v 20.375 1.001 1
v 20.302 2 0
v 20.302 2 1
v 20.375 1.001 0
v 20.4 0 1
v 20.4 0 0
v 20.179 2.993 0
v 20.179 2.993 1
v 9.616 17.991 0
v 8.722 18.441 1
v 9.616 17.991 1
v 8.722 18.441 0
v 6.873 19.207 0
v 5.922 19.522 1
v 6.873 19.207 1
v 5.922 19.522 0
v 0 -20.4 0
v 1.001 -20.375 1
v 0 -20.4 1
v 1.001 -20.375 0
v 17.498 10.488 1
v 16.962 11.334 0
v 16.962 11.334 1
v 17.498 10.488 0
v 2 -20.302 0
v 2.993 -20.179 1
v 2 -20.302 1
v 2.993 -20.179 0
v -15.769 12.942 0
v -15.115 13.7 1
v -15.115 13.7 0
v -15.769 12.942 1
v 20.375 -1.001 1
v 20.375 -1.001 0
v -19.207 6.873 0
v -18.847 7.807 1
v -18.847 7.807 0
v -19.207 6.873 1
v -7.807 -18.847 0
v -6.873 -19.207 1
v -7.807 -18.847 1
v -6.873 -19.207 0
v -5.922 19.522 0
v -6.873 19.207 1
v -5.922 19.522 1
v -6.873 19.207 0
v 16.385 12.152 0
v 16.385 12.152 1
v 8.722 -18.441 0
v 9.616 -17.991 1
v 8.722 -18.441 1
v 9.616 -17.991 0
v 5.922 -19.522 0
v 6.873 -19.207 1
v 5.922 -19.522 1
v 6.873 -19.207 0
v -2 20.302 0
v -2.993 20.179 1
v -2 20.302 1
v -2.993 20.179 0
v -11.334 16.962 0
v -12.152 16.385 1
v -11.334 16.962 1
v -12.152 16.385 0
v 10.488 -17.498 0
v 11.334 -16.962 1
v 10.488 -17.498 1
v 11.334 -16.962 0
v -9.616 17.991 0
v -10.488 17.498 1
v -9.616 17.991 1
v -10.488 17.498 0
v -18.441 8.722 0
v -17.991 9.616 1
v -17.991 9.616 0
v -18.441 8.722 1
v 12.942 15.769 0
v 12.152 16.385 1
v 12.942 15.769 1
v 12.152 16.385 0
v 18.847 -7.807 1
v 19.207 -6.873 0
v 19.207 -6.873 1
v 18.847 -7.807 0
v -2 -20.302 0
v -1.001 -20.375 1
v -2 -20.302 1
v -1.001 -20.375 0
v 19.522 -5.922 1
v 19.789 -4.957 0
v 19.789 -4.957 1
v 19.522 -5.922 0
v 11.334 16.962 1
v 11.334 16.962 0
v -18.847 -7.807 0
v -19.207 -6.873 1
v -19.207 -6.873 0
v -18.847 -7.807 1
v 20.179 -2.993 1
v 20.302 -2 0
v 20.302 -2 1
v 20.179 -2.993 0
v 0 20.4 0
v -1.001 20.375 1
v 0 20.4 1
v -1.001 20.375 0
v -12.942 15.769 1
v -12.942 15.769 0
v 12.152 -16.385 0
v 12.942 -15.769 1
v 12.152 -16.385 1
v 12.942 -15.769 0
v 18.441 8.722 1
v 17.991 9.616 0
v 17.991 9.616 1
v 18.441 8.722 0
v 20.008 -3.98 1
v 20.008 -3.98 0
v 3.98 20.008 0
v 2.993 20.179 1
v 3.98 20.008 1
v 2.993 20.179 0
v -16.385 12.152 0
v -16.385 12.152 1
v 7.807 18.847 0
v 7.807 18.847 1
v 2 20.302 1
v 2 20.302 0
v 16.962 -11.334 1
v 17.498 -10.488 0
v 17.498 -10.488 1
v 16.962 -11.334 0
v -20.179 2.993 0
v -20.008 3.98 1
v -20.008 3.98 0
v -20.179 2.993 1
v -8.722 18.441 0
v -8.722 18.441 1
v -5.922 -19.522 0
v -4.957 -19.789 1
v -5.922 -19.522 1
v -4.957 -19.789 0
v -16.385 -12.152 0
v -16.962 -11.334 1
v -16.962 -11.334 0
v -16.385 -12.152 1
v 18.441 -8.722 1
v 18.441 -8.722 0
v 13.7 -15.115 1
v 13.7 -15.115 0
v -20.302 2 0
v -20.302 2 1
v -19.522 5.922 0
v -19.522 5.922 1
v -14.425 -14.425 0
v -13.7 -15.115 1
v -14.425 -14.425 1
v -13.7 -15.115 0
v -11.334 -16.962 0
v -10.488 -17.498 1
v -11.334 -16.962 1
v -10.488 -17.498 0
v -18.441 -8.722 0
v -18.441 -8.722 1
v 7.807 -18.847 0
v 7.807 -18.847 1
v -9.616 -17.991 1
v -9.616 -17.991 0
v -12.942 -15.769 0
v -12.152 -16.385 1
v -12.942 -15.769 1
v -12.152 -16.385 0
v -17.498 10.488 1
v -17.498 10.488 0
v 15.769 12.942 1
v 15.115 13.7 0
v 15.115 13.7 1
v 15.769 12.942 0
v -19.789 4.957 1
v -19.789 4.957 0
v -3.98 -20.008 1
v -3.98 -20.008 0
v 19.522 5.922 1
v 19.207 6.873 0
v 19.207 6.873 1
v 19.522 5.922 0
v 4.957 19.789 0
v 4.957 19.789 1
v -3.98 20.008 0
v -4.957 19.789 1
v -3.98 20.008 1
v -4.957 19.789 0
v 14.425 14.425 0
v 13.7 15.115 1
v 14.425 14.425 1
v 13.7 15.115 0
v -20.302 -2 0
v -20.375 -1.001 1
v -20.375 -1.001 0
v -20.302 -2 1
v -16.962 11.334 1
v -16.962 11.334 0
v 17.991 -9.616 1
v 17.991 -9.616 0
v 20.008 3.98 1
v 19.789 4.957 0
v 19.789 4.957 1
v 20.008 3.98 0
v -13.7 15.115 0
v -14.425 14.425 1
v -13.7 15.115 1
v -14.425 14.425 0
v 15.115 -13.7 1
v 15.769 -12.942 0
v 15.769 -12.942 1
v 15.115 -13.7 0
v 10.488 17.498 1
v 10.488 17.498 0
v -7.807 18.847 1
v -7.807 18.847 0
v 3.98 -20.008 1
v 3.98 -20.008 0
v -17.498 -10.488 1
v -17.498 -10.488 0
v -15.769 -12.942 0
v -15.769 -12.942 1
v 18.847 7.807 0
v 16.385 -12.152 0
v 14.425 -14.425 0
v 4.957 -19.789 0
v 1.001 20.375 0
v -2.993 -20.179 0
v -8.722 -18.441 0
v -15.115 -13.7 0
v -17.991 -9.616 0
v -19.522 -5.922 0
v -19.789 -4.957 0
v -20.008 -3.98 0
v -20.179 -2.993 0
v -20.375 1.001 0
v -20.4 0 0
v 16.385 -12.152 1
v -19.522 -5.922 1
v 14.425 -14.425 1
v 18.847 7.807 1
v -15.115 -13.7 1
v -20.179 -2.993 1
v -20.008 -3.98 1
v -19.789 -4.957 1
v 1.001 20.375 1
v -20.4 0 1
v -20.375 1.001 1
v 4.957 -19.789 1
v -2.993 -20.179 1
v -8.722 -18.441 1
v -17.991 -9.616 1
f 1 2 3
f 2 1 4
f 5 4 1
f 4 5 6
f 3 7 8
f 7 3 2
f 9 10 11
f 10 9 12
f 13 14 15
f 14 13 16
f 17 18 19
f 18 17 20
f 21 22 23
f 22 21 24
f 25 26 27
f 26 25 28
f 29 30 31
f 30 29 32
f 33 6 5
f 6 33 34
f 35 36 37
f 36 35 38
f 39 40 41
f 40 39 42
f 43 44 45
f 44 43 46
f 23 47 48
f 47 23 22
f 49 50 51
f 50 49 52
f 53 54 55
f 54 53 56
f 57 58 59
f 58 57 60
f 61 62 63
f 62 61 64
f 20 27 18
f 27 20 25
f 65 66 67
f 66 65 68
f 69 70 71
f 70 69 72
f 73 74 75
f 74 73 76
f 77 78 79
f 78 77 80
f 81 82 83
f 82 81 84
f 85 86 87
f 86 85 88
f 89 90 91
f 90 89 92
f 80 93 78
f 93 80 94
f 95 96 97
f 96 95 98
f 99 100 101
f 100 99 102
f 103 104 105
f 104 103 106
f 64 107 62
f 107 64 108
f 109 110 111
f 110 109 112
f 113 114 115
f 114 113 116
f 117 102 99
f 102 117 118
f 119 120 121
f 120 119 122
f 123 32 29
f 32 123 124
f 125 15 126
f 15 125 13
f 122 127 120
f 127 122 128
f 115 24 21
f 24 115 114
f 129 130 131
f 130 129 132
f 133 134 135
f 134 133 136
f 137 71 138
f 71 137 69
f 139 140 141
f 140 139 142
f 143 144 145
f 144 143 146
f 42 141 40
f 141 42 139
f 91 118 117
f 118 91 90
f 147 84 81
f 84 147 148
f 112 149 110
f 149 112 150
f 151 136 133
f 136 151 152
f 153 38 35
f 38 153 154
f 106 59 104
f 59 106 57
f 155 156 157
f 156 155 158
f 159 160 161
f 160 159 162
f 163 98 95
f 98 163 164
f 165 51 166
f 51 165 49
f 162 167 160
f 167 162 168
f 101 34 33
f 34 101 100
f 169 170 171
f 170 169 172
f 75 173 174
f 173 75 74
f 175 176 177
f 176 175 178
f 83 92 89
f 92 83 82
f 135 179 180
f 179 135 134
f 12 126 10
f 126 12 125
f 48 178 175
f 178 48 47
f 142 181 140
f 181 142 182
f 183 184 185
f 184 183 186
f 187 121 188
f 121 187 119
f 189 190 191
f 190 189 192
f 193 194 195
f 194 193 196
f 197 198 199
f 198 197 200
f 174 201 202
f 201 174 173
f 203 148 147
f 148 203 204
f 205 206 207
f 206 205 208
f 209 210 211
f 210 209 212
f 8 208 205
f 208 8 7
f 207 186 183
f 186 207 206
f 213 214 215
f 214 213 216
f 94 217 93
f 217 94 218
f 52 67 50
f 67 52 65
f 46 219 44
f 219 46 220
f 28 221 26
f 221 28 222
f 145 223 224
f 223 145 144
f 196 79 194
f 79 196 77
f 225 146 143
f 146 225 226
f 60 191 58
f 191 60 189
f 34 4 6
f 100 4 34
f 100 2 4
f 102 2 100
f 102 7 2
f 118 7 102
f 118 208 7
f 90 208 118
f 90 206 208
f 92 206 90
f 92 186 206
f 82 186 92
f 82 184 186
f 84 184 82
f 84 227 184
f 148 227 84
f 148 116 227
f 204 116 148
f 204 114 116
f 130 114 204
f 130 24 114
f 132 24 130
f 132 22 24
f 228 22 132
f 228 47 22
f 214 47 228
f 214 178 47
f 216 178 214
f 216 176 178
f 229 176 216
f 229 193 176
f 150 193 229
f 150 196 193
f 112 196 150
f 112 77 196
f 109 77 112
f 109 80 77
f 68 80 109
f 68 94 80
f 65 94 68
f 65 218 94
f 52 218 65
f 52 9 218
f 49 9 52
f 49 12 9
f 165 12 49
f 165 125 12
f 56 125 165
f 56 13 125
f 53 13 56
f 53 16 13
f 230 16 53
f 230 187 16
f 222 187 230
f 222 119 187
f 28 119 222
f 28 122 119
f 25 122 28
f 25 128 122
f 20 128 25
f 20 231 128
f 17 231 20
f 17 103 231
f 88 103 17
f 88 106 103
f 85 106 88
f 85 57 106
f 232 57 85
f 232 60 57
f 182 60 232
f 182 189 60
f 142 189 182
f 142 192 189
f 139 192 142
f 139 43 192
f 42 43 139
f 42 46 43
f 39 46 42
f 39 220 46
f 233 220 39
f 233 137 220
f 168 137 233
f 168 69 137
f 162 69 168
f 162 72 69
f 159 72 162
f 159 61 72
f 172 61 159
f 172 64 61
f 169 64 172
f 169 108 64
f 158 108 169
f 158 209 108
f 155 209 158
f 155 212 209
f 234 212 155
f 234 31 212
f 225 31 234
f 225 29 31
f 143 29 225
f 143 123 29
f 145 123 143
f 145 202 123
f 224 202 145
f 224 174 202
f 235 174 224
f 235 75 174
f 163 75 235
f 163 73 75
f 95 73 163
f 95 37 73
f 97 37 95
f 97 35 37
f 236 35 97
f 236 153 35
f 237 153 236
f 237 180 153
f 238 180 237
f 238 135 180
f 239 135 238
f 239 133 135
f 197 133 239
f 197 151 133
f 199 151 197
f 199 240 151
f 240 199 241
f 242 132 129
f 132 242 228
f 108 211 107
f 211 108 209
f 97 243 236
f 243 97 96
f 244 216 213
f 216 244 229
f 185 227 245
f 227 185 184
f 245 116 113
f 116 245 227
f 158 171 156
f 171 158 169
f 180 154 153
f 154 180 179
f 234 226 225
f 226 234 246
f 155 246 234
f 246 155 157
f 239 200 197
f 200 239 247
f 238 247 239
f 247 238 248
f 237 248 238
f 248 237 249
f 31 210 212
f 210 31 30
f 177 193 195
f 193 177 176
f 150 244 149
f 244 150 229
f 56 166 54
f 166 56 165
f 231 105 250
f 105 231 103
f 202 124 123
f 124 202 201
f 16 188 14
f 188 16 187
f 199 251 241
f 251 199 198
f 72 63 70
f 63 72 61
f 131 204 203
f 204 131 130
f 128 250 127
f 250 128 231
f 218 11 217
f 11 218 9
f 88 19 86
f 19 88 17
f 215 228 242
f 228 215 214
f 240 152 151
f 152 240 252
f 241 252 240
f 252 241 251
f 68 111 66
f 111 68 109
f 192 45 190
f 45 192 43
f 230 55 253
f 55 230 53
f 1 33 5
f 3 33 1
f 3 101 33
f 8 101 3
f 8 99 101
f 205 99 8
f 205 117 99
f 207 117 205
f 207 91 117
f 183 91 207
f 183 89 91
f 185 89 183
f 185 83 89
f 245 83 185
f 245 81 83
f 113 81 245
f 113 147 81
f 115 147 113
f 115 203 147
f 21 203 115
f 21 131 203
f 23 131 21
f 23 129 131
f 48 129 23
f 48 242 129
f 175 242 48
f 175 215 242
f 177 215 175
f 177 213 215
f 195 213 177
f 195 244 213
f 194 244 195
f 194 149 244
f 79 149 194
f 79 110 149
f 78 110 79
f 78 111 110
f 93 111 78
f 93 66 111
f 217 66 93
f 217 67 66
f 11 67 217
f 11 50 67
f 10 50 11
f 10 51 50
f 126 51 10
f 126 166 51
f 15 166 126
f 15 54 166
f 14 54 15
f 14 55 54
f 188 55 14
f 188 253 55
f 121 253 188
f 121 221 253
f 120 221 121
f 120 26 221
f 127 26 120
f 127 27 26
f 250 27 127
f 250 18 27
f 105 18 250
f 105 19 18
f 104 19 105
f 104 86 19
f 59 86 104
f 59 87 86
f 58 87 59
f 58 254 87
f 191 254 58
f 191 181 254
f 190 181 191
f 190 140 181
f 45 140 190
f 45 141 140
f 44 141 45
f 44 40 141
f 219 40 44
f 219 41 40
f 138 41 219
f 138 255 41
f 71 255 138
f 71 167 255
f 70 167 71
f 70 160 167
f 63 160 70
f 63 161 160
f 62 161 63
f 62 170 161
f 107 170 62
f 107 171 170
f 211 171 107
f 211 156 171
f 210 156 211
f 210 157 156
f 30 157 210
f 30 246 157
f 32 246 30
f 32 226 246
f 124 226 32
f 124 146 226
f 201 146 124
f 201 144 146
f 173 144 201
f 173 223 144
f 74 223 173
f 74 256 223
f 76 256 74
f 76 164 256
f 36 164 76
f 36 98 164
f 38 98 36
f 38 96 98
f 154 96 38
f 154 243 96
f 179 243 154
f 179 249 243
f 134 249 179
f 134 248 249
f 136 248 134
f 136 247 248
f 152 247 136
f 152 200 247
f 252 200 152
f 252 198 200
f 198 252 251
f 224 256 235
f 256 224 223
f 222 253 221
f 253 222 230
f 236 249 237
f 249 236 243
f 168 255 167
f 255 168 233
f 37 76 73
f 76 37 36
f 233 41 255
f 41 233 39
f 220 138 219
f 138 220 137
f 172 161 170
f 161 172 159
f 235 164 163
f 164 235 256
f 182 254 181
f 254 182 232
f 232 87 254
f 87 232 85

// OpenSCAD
$fn = 128;

radii = [20.4, 10.8, 5.3, 1];

module radial(rs, h=1) {
    union() {
        for (r = rs) {
            cylinder(r=r, h=h, center=false);
        }
    }
}

radial(radii, 1);
